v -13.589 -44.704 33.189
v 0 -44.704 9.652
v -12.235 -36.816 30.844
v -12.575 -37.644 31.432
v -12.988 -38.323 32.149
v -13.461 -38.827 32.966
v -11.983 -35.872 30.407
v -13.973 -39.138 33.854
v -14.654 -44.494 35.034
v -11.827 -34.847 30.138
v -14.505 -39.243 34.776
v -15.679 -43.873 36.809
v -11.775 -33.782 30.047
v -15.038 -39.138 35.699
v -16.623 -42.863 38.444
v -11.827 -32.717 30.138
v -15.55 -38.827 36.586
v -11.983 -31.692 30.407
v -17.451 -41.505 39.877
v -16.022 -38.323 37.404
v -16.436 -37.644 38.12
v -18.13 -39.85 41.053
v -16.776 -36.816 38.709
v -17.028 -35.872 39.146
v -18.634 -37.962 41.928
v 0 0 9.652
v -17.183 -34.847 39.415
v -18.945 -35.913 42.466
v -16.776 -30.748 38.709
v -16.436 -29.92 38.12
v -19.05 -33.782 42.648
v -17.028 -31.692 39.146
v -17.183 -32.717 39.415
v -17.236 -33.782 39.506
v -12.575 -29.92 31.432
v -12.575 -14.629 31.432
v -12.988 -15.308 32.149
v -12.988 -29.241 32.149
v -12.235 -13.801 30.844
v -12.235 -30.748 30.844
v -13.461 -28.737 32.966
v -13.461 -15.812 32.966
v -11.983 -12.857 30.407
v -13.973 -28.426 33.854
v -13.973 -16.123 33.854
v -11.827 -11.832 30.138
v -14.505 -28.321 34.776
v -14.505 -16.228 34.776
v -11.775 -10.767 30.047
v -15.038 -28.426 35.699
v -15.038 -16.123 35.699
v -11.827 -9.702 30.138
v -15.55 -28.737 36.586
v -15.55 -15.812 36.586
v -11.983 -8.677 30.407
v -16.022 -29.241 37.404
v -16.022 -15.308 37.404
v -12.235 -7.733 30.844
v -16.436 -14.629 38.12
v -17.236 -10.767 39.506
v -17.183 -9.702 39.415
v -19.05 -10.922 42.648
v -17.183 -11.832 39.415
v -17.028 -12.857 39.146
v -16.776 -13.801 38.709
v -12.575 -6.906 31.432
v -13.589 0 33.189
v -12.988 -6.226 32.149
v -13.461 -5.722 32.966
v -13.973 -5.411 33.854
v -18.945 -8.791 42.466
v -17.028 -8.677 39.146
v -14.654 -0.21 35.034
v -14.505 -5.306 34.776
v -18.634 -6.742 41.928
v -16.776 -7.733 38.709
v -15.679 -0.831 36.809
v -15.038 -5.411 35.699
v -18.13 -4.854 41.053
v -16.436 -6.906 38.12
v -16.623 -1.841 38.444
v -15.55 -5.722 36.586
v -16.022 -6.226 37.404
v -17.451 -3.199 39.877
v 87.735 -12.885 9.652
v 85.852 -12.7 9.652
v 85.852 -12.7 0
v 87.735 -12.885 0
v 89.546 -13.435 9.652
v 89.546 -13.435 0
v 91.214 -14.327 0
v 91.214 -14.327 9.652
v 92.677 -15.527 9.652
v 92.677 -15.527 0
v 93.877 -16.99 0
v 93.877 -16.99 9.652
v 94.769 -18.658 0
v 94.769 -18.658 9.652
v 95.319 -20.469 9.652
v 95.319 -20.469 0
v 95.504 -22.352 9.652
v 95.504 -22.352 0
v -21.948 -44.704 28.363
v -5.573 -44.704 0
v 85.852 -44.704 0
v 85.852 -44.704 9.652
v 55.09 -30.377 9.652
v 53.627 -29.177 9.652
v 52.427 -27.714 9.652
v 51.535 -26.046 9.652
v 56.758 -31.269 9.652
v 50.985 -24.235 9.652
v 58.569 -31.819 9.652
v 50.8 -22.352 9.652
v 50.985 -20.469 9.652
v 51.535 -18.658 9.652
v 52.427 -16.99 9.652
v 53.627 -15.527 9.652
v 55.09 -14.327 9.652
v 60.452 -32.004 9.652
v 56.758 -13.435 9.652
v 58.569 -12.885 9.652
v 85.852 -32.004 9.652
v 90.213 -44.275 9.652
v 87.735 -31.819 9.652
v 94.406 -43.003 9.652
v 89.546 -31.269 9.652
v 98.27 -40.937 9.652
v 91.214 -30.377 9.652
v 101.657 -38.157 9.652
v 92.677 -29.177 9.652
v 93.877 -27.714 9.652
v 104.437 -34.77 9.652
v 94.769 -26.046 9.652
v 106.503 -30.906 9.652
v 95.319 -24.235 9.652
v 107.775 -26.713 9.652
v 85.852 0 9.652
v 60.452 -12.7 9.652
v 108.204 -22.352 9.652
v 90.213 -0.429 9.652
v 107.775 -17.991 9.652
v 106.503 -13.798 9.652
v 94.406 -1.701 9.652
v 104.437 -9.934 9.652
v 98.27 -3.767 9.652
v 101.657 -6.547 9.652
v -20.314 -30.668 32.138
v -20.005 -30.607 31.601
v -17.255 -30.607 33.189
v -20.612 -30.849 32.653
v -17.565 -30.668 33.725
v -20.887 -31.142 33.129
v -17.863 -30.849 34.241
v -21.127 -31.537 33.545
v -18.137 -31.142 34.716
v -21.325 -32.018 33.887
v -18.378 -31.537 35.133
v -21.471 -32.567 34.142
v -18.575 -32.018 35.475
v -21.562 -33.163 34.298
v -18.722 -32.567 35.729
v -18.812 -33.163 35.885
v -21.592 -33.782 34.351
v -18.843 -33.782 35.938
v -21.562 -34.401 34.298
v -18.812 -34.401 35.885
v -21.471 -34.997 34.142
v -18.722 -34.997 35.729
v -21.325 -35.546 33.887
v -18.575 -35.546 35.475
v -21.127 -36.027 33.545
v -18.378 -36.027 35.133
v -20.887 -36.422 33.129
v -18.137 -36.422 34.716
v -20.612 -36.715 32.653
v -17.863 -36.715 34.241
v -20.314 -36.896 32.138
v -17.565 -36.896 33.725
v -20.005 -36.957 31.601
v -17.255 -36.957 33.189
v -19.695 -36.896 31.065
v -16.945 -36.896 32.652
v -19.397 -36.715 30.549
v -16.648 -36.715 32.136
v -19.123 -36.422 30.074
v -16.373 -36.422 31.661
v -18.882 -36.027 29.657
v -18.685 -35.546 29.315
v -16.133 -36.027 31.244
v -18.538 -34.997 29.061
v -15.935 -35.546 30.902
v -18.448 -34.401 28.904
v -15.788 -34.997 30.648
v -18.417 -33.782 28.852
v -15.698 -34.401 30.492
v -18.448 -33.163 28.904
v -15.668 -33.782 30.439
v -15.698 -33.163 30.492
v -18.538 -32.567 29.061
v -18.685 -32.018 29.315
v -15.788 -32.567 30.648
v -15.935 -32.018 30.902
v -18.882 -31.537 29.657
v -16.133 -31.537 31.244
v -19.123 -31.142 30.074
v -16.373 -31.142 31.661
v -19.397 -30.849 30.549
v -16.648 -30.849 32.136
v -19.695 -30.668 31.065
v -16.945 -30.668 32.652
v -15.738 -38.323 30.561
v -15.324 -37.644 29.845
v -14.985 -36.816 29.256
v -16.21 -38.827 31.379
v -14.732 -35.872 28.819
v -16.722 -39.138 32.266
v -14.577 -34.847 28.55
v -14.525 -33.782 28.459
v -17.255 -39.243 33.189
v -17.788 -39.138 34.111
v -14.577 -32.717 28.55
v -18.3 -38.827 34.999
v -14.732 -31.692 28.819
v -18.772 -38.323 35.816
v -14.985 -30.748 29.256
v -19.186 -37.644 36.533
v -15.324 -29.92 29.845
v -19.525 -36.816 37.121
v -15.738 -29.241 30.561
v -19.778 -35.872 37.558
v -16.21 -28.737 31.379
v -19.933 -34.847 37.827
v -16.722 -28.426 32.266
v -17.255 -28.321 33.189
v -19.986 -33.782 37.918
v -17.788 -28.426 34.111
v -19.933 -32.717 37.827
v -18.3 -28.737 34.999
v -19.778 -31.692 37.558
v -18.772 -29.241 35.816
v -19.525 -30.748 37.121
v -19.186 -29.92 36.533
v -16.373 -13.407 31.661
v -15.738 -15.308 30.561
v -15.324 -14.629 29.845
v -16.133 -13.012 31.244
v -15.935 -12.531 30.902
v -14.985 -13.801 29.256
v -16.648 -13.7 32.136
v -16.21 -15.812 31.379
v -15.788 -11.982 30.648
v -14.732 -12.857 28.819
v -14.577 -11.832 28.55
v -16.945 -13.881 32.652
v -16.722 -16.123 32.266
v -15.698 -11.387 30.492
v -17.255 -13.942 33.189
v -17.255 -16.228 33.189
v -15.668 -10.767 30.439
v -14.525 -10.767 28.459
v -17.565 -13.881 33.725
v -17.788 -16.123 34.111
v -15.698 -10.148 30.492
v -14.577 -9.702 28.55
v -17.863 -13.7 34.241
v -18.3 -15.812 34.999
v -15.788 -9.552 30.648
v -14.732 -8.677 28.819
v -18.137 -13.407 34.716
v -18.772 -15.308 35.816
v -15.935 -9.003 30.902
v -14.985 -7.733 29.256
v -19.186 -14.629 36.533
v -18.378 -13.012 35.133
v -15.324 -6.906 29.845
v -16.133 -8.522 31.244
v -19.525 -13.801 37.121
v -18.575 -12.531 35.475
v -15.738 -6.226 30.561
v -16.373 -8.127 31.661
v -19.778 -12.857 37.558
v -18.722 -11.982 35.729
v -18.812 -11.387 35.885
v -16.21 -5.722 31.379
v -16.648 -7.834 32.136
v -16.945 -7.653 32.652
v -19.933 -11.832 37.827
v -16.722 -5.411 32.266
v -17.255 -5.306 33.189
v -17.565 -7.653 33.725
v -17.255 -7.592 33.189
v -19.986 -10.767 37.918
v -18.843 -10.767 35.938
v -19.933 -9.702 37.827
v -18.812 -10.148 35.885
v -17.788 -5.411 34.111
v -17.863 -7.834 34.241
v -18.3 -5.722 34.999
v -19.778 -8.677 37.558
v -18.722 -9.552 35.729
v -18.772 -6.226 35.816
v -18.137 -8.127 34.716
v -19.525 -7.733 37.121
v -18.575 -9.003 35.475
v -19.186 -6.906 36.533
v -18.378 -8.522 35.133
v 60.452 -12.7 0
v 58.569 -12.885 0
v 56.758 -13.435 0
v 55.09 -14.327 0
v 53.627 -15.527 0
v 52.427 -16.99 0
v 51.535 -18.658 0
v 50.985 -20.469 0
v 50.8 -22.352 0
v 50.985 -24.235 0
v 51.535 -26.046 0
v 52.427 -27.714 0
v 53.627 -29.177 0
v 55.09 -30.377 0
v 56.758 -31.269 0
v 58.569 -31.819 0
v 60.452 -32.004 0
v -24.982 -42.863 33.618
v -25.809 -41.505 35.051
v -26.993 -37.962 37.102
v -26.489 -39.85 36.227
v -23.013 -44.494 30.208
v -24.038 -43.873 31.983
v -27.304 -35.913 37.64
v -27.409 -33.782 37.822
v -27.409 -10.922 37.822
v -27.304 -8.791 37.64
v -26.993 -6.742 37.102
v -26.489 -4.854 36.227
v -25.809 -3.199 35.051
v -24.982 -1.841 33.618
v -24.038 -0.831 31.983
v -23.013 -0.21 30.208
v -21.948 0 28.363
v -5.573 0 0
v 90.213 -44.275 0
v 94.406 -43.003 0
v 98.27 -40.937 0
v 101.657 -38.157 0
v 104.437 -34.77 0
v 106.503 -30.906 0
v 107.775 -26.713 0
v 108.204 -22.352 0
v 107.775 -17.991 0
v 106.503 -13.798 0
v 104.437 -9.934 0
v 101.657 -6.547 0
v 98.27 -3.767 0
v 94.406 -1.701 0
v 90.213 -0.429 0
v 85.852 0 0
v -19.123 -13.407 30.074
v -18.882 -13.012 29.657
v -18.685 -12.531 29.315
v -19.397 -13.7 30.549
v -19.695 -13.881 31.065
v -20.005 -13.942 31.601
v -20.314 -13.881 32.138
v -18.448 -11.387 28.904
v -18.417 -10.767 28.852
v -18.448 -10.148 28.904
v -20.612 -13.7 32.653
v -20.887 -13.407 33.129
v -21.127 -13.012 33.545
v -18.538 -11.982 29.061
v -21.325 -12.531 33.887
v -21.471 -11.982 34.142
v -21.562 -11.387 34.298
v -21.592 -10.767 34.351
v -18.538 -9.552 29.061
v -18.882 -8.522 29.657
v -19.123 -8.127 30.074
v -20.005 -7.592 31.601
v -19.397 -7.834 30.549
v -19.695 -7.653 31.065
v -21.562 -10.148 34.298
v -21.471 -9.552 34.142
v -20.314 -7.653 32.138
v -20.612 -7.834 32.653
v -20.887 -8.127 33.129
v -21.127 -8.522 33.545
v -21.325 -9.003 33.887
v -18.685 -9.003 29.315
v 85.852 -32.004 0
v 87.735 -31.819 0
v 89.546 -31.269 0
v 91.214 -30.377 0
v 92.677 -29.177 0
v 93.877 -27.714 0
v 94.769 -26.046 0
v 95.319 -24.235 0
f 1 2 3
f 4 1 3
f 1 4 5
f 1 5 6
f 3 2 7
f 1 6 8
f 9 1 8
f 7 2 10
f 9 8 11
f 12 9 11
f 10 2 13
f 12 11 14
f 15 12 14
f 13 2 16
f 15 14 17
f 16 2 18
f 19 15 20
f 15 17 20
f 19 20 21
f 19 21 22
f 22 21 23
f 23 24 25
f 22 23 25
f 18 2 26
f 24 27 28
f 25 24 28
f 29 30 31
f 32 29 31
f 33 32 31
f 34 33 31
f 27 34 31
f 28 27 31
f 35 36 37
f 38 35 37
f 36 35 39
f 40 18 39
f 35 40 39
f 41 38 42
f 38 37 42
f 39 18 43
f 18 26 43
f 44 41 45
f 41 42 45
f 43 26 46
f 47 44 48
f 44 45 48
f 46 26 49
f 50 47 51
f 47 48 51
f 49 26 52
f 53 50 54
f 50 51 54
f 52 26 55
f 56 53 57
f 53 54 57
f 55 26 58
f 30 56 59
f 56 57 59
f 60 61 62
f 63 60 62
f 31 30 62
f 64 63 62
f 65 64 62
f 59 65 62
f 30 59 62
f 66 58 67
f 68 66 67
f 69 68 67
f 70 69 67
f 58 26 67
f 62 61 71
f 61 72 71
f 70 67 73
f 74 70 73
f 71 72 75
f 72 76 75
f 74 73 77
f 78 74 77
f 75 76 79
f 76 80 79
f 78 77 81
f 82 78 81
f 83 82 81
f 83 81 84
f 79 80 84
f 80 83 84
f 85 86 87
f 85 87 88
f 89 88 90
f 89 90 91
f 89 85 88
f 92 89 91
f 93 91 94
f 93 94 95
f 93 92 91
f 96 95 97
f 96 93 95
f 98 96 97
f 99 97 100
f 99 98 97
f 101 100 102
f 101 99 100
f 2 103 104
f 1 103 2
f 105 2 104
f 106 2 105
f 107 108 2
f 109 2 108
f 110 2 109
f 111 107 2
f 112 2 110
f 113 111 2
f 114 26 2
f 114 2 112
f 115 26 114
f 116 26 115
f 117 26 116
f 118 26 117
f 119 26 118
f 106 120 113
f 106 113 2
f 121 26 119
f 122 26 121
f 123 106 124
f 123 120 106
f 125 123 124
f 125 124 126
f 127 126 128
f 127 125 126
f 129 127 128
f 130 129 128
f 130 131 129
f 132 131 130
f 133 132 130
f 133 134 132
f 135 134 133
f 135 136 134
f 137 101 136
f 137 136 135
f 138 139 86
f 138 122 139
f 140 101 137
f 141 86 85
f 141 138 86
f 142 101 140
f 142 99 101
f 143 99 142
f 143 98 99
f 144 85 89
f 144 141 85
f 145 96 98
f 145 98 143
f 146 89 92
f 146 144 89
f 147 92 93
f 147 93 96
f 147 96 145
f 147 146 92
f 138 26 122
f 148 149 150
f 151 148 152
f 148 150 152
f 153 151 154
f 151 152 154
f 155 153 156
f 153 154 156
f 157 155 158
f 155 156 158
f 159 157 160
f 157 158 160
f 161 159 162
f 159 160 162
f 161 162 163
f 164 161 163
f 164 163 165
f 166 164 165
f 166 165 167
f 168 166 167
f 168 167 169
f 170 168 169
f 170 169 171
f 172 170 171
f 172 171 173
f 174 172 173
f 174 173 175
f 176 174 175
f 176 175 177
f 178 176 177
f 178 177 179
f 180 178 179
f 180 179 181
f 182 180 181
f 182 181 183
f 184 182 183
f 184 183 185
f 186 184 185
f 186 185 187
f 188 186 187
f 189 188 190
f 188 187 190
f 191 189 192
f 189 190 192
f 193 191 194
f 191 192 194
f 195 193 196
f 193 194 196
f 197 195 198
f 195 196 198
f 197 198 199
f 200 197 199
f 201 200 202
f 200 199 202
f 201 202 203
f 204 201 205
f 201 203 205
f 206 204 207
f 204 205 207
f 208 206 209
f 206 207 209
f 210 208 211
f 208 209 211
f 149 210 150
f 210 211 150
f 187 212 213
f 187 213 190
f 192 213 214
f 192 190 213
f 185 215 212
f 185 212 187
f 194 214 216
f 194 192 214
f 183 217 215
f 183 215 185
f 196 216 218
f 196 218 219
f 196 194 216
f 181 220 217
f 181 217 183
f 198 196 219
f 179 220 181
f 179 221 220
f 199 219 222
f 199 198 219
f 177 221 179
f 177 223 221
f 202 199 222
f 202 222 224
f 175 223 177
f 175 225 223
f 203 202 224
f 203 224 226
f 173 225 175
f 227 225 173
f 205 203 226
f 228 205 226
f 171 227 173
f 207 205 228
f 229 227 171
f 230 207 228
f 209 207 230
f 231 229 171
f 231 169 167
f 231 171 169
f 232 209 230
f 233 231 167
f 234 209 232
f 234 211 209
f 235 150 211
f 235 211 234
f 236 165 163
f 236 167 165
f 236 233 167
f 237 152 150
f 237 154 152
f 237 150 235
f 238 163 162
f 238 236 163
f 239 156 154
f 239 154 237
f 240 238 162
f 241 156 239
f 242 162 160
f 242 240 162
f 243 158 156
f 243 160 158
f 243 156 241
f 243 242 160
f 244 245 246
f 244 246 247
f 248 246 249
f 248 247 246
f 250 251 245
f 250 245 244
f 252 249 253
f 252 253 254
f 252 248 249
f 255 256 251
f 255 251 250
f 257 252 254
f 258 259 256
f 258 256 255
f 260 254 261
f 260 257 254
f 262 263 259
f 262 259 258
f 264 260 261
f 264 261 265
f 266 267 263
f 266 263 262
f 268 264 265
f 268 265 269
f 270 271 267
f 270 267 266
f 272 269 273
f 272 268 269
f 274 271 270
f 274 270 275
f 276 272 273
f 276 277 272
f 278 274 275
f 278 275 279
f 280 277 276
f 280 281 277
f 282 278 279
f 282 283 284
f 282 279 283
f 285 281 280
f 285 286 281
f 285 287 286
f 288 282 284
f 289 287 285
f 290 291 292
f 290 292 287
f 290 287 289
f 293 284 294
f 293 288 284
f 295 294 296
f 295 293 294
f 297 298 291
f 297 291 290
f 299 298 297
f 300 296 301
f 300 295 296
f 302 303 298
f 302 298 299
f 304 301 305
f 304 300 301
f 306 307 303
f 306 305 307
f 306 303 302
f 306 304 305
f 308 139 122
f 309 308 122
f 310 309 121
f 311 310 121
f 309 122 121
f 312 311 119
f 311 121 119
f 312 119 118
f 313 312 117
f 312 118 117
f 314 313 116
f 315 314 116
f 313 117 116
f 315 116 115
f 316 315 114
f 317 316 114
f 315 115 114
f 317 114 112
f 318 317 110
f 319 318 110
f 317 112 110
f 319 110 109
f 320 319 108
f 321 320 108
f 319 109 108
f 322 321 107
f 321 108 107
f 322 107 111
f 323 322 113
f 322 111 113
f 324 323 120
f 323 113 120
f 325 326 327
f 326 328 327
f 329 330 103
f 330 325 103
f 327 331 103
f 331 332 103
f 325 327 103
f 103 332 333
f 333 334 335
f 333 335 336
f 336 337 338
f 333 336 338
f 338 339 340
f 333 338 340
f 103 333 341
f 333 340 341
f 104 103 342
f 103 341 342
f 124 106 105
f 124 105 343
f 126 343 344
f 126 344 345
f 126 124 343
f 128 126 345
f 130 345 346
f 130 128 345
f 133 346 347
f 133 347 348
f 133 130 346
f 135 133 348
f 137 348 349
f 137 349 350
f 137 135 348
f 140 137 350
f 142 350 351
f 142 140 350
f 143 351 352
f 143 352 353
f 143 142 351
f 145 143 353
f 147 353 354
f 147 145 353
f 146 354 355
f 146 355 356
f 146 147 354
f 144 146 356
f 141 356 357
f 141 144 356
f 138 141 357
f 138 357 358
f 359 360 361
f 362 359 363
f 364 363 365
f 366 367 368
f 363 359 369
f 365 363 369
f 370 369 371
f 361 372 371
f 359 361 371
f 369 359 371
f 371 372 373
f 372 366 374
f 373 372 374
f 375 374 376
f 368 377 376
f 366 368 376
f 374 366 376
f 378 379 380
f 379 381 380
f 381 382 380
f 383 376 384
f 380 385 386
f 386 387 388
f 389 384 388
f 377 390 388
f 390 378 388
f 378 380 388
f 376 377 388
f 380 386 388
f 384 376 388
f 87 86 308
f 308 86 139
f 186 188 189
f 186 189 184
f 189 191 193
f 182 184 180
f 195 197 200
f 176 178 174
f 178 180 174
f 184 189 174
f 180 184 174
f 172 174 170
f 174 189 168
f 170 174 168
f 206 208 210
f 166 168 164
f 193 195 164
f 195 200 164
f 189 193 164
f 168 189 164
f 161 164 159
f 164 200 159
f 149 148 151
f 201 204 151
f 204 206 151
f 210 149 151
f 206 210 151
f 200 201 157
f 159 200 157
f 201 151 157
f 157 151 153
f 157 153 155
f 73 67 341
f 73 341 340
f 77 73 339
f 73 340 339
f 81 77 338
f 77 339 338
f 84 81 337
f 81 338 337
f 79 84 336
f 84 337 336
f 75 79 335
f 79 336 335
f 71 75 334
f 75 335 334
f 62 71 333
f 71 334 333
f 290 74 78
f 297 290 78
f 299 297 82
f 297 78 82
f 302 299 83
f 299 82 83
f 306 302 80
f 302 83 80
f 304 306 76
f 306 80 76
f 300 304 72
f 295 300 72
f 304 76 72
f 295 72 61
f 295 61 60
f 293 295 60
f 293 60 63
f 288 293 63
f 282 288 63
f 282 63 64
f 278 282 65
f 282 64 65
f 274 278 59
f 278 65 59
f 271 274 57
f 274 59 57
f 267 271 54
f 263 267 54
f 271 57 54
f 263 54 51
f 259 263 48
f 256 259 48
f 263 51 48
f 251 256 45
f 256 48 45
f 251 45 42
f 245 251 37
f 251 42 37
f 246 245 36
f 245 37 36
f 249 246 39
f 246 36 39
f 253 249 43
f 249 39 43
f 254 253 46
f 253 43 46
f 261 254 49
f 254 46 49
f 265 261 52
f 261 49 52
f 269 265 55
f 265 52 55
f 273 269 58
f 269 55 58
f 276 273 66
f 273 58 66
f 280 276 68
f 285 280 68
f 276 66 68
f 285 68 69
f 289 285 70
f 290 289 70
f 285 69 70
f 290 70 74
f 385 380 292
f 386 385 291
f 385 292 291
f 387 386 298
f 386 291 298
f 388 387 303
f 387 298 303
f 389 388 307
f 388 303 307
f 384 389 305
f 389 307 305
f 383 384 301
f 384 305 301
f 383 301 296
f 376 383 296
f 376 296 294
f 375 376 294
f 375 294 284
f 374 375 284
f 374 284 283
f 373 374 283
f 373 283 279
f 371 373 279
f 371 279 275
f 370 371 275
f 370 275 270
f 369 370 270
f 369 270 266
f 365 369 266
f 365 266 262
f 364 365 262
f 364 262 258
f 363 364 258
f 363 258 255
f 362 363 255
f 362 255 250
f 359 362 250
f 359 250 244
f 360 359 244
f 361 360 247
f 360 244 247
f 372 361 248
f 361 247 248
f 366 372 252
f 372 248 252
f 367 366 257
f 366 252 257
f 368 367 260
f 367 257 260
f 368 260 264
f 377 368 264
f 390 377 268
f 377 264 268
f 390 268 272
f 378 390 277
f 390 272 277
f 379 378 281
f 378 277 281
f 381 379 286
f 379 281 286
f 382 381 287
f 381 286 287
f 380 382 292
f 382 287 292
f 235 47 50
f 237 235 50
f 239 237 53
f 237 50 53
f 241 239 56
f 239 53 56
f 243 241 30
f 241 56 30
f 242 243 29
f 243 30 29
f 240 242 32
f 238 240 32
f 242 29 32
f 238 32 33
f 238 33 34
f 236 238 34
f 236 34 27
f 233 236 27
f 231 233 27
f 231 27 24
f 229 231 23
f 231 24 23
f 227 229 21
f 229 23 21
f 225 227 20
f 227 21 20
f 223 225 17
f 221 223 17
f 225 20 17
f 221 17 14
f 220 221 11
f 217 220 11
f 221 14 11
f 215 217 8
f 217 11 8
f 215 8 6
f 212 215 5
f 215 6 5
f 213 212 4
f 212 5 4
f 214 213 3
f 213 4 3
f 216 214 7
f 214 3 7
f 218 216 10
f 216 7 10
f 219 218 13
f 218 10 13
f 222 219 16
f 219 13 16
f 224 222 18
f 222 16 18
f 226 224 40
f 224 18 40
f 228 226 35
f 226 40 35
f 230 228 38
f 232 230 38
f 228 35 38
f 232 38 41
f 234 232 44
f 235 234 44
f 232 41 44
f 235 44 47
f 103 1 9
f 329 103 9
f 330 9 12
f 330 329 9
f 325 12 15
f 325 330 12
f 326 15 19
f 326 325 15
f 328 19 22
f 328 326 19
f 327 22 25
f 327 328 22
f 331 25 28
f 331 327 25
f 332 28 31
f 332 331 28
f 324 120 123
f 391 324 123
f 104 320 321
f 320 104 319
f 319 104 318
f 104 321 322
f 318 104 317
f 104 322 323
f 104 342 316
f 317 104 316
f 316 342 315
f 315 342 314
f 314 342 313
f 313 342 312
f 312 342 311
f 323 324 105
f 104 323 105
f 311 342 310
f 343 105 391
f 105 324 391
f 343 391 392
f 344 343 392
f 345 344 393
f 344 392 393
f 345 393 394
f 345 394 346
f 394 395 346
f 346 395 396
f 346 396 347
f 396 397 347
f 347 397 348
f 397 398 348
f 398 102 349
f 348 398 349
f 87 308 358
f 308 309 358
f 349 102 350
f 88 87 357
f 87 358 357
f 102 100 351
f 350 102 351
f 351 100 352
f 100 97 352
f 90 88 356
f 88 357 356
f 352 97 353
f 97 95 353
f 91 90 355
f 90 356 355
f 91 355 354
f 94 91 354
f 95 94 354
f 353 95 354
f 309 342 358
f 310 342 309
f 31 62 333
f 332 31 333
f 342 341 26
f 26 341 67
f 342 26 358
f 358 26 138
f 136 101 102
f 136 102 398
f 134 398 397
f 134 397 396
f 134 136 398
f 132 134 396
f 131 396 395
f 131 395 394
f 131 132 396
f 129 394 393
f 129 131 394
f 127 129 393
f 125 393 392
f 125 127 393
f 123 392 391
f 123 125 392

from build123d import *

# Parameters (mm, degrees)
F1_DEPTH = 44.704
F3_DEPTH = 9.652
F4_DEPTH = 25.4
F5_R     = 10.922
F6_R     = 5.461
F6_R_2   = 3.175
F7_DEPTH = 3.175
F8_DEPTH = 6.35


with BuildPart() as f1:
    # F0 (on Front) → F1 (new body)
    with BuildSketch(Plane.XZ):
        Polygon((-5.5725847982, 0), (85.852, 0), (85.852, 9.652), (0, 9.652), (-19.05, 42.6475678842), (-27.4088771973, 37.8215678842), align=None)
    extrude(amount=F1_DEPTH)

    # F2 (on face) → F3 (join)
    with BuildSketch(Plane.XY.offset(9.652)):
        with BuildLine():
            ThreePointArc((85.852, -12.7), (92.676994652, -15.527005348), (95.504, -22.352))
            ThreePointArc((95.504, -22.352), (92.676994652, -29.176994652), (85.852, -32.004))
            Line((85.852, -32.004), (85.852, -44.704))
            ThreePointArc((85.852, -44.704), (108.204, -22.352), (85.852, 0))
            Line((85.852, 0), (85.852, -12.7))
        make_face()
    extrude(amount=-F3_DEPTH)

    # F2 (on face) → F4 (cut)
    with BuildSketch(Plane.XY.offset(9.652)):
        with BuildLine():
            ThreePointArc((85.852, -32.004), (92.676994652, -29.176994652), (95.504, -22.352))
            ThreePointArc((95.504, -22.352), (92.676994652, -15.527005348), (85.852, -12.7))
            ThreePointArc((85.852, -12.7), (76.2, -22.352), (85.852, -32.004))
        make_face()
        with BuildLine():
            ThreePointArc((85.852, -32.004), (76.2, -22.352), (85.852, -12.7))
            Line((85.852, -12.7), (60.452, -12.7))
            ThreePointArc((60.452, -12.7), (67.276994652, -15.527005348), (70.104, -22.352))
            ThreePointArc((70.104, -22.352), (67.276994652, -29.176994652), (60.452, -32.004))
            Line((60.452, -32.004), (85.852, -32.004))
        make_face()
        with BuildLine():
            ThreePointArc((70.104, -22.352), (67.276994652, -15.527005348), (60.452, -12.7))
            ThreePointArc((60.452, -12.7), (50.8, -22.352), (60.452, -32.004))
            ThreePointArc((60.452, -32.004), (67.276994652, -29.176994652), (70.104, -22.352))
        make_face()
    extrude(amount=-F4_DEPTH, mode=Mode.SUBTRACT)

    # F5
    f5_edges = [f1.edges().sort_by_distance(p)[0] for p in [
        (-23.229439, -44.704, 40.234568),
        (-23.229439, 0, 40.234568),
    ]]
    fillet(f5_edges, radius=F5_R)

    # F6 (on face) → F7 (cut)
    with BuildSketch(Plane(origin=(4.1794385987, 0, 2.413), x_dir=(0, 1, 0), z_dir=(0.8660254038, 0, 0.5))):
        with Locations((-33.782, 37.3698046379)):
            Circle(F6_R)
        with Locations((-33.782, 37.3698046379)):
            Circle(F6_R_2, mode=Mode.SUBTRACT)
        with Locations((-10.7671008632, 37.3698046379)):
            Circle(F6_R)
        with Locations((-10.7671008632, 37.3698046379)):
            Circle(F6_R_2, mode=Mode.SUBTRACT)
    extrude(amount=-F7_DEPTH, mode=Mode.SUBTRACT)

    # F8 (cut): faces of the model
    f8_faces = [f1.faces().sort_by_distance(p)[0] for p in [
        (-14.5054637203, -33.782, 34.7762001509),
        (-14.5054637203, -10.7671008632, 34.7762001509),
    ]]
    extrude(f8_faces, amount=-F8_DEPTH, mode=Mode.SUBTRACT)


solid = f1.part
